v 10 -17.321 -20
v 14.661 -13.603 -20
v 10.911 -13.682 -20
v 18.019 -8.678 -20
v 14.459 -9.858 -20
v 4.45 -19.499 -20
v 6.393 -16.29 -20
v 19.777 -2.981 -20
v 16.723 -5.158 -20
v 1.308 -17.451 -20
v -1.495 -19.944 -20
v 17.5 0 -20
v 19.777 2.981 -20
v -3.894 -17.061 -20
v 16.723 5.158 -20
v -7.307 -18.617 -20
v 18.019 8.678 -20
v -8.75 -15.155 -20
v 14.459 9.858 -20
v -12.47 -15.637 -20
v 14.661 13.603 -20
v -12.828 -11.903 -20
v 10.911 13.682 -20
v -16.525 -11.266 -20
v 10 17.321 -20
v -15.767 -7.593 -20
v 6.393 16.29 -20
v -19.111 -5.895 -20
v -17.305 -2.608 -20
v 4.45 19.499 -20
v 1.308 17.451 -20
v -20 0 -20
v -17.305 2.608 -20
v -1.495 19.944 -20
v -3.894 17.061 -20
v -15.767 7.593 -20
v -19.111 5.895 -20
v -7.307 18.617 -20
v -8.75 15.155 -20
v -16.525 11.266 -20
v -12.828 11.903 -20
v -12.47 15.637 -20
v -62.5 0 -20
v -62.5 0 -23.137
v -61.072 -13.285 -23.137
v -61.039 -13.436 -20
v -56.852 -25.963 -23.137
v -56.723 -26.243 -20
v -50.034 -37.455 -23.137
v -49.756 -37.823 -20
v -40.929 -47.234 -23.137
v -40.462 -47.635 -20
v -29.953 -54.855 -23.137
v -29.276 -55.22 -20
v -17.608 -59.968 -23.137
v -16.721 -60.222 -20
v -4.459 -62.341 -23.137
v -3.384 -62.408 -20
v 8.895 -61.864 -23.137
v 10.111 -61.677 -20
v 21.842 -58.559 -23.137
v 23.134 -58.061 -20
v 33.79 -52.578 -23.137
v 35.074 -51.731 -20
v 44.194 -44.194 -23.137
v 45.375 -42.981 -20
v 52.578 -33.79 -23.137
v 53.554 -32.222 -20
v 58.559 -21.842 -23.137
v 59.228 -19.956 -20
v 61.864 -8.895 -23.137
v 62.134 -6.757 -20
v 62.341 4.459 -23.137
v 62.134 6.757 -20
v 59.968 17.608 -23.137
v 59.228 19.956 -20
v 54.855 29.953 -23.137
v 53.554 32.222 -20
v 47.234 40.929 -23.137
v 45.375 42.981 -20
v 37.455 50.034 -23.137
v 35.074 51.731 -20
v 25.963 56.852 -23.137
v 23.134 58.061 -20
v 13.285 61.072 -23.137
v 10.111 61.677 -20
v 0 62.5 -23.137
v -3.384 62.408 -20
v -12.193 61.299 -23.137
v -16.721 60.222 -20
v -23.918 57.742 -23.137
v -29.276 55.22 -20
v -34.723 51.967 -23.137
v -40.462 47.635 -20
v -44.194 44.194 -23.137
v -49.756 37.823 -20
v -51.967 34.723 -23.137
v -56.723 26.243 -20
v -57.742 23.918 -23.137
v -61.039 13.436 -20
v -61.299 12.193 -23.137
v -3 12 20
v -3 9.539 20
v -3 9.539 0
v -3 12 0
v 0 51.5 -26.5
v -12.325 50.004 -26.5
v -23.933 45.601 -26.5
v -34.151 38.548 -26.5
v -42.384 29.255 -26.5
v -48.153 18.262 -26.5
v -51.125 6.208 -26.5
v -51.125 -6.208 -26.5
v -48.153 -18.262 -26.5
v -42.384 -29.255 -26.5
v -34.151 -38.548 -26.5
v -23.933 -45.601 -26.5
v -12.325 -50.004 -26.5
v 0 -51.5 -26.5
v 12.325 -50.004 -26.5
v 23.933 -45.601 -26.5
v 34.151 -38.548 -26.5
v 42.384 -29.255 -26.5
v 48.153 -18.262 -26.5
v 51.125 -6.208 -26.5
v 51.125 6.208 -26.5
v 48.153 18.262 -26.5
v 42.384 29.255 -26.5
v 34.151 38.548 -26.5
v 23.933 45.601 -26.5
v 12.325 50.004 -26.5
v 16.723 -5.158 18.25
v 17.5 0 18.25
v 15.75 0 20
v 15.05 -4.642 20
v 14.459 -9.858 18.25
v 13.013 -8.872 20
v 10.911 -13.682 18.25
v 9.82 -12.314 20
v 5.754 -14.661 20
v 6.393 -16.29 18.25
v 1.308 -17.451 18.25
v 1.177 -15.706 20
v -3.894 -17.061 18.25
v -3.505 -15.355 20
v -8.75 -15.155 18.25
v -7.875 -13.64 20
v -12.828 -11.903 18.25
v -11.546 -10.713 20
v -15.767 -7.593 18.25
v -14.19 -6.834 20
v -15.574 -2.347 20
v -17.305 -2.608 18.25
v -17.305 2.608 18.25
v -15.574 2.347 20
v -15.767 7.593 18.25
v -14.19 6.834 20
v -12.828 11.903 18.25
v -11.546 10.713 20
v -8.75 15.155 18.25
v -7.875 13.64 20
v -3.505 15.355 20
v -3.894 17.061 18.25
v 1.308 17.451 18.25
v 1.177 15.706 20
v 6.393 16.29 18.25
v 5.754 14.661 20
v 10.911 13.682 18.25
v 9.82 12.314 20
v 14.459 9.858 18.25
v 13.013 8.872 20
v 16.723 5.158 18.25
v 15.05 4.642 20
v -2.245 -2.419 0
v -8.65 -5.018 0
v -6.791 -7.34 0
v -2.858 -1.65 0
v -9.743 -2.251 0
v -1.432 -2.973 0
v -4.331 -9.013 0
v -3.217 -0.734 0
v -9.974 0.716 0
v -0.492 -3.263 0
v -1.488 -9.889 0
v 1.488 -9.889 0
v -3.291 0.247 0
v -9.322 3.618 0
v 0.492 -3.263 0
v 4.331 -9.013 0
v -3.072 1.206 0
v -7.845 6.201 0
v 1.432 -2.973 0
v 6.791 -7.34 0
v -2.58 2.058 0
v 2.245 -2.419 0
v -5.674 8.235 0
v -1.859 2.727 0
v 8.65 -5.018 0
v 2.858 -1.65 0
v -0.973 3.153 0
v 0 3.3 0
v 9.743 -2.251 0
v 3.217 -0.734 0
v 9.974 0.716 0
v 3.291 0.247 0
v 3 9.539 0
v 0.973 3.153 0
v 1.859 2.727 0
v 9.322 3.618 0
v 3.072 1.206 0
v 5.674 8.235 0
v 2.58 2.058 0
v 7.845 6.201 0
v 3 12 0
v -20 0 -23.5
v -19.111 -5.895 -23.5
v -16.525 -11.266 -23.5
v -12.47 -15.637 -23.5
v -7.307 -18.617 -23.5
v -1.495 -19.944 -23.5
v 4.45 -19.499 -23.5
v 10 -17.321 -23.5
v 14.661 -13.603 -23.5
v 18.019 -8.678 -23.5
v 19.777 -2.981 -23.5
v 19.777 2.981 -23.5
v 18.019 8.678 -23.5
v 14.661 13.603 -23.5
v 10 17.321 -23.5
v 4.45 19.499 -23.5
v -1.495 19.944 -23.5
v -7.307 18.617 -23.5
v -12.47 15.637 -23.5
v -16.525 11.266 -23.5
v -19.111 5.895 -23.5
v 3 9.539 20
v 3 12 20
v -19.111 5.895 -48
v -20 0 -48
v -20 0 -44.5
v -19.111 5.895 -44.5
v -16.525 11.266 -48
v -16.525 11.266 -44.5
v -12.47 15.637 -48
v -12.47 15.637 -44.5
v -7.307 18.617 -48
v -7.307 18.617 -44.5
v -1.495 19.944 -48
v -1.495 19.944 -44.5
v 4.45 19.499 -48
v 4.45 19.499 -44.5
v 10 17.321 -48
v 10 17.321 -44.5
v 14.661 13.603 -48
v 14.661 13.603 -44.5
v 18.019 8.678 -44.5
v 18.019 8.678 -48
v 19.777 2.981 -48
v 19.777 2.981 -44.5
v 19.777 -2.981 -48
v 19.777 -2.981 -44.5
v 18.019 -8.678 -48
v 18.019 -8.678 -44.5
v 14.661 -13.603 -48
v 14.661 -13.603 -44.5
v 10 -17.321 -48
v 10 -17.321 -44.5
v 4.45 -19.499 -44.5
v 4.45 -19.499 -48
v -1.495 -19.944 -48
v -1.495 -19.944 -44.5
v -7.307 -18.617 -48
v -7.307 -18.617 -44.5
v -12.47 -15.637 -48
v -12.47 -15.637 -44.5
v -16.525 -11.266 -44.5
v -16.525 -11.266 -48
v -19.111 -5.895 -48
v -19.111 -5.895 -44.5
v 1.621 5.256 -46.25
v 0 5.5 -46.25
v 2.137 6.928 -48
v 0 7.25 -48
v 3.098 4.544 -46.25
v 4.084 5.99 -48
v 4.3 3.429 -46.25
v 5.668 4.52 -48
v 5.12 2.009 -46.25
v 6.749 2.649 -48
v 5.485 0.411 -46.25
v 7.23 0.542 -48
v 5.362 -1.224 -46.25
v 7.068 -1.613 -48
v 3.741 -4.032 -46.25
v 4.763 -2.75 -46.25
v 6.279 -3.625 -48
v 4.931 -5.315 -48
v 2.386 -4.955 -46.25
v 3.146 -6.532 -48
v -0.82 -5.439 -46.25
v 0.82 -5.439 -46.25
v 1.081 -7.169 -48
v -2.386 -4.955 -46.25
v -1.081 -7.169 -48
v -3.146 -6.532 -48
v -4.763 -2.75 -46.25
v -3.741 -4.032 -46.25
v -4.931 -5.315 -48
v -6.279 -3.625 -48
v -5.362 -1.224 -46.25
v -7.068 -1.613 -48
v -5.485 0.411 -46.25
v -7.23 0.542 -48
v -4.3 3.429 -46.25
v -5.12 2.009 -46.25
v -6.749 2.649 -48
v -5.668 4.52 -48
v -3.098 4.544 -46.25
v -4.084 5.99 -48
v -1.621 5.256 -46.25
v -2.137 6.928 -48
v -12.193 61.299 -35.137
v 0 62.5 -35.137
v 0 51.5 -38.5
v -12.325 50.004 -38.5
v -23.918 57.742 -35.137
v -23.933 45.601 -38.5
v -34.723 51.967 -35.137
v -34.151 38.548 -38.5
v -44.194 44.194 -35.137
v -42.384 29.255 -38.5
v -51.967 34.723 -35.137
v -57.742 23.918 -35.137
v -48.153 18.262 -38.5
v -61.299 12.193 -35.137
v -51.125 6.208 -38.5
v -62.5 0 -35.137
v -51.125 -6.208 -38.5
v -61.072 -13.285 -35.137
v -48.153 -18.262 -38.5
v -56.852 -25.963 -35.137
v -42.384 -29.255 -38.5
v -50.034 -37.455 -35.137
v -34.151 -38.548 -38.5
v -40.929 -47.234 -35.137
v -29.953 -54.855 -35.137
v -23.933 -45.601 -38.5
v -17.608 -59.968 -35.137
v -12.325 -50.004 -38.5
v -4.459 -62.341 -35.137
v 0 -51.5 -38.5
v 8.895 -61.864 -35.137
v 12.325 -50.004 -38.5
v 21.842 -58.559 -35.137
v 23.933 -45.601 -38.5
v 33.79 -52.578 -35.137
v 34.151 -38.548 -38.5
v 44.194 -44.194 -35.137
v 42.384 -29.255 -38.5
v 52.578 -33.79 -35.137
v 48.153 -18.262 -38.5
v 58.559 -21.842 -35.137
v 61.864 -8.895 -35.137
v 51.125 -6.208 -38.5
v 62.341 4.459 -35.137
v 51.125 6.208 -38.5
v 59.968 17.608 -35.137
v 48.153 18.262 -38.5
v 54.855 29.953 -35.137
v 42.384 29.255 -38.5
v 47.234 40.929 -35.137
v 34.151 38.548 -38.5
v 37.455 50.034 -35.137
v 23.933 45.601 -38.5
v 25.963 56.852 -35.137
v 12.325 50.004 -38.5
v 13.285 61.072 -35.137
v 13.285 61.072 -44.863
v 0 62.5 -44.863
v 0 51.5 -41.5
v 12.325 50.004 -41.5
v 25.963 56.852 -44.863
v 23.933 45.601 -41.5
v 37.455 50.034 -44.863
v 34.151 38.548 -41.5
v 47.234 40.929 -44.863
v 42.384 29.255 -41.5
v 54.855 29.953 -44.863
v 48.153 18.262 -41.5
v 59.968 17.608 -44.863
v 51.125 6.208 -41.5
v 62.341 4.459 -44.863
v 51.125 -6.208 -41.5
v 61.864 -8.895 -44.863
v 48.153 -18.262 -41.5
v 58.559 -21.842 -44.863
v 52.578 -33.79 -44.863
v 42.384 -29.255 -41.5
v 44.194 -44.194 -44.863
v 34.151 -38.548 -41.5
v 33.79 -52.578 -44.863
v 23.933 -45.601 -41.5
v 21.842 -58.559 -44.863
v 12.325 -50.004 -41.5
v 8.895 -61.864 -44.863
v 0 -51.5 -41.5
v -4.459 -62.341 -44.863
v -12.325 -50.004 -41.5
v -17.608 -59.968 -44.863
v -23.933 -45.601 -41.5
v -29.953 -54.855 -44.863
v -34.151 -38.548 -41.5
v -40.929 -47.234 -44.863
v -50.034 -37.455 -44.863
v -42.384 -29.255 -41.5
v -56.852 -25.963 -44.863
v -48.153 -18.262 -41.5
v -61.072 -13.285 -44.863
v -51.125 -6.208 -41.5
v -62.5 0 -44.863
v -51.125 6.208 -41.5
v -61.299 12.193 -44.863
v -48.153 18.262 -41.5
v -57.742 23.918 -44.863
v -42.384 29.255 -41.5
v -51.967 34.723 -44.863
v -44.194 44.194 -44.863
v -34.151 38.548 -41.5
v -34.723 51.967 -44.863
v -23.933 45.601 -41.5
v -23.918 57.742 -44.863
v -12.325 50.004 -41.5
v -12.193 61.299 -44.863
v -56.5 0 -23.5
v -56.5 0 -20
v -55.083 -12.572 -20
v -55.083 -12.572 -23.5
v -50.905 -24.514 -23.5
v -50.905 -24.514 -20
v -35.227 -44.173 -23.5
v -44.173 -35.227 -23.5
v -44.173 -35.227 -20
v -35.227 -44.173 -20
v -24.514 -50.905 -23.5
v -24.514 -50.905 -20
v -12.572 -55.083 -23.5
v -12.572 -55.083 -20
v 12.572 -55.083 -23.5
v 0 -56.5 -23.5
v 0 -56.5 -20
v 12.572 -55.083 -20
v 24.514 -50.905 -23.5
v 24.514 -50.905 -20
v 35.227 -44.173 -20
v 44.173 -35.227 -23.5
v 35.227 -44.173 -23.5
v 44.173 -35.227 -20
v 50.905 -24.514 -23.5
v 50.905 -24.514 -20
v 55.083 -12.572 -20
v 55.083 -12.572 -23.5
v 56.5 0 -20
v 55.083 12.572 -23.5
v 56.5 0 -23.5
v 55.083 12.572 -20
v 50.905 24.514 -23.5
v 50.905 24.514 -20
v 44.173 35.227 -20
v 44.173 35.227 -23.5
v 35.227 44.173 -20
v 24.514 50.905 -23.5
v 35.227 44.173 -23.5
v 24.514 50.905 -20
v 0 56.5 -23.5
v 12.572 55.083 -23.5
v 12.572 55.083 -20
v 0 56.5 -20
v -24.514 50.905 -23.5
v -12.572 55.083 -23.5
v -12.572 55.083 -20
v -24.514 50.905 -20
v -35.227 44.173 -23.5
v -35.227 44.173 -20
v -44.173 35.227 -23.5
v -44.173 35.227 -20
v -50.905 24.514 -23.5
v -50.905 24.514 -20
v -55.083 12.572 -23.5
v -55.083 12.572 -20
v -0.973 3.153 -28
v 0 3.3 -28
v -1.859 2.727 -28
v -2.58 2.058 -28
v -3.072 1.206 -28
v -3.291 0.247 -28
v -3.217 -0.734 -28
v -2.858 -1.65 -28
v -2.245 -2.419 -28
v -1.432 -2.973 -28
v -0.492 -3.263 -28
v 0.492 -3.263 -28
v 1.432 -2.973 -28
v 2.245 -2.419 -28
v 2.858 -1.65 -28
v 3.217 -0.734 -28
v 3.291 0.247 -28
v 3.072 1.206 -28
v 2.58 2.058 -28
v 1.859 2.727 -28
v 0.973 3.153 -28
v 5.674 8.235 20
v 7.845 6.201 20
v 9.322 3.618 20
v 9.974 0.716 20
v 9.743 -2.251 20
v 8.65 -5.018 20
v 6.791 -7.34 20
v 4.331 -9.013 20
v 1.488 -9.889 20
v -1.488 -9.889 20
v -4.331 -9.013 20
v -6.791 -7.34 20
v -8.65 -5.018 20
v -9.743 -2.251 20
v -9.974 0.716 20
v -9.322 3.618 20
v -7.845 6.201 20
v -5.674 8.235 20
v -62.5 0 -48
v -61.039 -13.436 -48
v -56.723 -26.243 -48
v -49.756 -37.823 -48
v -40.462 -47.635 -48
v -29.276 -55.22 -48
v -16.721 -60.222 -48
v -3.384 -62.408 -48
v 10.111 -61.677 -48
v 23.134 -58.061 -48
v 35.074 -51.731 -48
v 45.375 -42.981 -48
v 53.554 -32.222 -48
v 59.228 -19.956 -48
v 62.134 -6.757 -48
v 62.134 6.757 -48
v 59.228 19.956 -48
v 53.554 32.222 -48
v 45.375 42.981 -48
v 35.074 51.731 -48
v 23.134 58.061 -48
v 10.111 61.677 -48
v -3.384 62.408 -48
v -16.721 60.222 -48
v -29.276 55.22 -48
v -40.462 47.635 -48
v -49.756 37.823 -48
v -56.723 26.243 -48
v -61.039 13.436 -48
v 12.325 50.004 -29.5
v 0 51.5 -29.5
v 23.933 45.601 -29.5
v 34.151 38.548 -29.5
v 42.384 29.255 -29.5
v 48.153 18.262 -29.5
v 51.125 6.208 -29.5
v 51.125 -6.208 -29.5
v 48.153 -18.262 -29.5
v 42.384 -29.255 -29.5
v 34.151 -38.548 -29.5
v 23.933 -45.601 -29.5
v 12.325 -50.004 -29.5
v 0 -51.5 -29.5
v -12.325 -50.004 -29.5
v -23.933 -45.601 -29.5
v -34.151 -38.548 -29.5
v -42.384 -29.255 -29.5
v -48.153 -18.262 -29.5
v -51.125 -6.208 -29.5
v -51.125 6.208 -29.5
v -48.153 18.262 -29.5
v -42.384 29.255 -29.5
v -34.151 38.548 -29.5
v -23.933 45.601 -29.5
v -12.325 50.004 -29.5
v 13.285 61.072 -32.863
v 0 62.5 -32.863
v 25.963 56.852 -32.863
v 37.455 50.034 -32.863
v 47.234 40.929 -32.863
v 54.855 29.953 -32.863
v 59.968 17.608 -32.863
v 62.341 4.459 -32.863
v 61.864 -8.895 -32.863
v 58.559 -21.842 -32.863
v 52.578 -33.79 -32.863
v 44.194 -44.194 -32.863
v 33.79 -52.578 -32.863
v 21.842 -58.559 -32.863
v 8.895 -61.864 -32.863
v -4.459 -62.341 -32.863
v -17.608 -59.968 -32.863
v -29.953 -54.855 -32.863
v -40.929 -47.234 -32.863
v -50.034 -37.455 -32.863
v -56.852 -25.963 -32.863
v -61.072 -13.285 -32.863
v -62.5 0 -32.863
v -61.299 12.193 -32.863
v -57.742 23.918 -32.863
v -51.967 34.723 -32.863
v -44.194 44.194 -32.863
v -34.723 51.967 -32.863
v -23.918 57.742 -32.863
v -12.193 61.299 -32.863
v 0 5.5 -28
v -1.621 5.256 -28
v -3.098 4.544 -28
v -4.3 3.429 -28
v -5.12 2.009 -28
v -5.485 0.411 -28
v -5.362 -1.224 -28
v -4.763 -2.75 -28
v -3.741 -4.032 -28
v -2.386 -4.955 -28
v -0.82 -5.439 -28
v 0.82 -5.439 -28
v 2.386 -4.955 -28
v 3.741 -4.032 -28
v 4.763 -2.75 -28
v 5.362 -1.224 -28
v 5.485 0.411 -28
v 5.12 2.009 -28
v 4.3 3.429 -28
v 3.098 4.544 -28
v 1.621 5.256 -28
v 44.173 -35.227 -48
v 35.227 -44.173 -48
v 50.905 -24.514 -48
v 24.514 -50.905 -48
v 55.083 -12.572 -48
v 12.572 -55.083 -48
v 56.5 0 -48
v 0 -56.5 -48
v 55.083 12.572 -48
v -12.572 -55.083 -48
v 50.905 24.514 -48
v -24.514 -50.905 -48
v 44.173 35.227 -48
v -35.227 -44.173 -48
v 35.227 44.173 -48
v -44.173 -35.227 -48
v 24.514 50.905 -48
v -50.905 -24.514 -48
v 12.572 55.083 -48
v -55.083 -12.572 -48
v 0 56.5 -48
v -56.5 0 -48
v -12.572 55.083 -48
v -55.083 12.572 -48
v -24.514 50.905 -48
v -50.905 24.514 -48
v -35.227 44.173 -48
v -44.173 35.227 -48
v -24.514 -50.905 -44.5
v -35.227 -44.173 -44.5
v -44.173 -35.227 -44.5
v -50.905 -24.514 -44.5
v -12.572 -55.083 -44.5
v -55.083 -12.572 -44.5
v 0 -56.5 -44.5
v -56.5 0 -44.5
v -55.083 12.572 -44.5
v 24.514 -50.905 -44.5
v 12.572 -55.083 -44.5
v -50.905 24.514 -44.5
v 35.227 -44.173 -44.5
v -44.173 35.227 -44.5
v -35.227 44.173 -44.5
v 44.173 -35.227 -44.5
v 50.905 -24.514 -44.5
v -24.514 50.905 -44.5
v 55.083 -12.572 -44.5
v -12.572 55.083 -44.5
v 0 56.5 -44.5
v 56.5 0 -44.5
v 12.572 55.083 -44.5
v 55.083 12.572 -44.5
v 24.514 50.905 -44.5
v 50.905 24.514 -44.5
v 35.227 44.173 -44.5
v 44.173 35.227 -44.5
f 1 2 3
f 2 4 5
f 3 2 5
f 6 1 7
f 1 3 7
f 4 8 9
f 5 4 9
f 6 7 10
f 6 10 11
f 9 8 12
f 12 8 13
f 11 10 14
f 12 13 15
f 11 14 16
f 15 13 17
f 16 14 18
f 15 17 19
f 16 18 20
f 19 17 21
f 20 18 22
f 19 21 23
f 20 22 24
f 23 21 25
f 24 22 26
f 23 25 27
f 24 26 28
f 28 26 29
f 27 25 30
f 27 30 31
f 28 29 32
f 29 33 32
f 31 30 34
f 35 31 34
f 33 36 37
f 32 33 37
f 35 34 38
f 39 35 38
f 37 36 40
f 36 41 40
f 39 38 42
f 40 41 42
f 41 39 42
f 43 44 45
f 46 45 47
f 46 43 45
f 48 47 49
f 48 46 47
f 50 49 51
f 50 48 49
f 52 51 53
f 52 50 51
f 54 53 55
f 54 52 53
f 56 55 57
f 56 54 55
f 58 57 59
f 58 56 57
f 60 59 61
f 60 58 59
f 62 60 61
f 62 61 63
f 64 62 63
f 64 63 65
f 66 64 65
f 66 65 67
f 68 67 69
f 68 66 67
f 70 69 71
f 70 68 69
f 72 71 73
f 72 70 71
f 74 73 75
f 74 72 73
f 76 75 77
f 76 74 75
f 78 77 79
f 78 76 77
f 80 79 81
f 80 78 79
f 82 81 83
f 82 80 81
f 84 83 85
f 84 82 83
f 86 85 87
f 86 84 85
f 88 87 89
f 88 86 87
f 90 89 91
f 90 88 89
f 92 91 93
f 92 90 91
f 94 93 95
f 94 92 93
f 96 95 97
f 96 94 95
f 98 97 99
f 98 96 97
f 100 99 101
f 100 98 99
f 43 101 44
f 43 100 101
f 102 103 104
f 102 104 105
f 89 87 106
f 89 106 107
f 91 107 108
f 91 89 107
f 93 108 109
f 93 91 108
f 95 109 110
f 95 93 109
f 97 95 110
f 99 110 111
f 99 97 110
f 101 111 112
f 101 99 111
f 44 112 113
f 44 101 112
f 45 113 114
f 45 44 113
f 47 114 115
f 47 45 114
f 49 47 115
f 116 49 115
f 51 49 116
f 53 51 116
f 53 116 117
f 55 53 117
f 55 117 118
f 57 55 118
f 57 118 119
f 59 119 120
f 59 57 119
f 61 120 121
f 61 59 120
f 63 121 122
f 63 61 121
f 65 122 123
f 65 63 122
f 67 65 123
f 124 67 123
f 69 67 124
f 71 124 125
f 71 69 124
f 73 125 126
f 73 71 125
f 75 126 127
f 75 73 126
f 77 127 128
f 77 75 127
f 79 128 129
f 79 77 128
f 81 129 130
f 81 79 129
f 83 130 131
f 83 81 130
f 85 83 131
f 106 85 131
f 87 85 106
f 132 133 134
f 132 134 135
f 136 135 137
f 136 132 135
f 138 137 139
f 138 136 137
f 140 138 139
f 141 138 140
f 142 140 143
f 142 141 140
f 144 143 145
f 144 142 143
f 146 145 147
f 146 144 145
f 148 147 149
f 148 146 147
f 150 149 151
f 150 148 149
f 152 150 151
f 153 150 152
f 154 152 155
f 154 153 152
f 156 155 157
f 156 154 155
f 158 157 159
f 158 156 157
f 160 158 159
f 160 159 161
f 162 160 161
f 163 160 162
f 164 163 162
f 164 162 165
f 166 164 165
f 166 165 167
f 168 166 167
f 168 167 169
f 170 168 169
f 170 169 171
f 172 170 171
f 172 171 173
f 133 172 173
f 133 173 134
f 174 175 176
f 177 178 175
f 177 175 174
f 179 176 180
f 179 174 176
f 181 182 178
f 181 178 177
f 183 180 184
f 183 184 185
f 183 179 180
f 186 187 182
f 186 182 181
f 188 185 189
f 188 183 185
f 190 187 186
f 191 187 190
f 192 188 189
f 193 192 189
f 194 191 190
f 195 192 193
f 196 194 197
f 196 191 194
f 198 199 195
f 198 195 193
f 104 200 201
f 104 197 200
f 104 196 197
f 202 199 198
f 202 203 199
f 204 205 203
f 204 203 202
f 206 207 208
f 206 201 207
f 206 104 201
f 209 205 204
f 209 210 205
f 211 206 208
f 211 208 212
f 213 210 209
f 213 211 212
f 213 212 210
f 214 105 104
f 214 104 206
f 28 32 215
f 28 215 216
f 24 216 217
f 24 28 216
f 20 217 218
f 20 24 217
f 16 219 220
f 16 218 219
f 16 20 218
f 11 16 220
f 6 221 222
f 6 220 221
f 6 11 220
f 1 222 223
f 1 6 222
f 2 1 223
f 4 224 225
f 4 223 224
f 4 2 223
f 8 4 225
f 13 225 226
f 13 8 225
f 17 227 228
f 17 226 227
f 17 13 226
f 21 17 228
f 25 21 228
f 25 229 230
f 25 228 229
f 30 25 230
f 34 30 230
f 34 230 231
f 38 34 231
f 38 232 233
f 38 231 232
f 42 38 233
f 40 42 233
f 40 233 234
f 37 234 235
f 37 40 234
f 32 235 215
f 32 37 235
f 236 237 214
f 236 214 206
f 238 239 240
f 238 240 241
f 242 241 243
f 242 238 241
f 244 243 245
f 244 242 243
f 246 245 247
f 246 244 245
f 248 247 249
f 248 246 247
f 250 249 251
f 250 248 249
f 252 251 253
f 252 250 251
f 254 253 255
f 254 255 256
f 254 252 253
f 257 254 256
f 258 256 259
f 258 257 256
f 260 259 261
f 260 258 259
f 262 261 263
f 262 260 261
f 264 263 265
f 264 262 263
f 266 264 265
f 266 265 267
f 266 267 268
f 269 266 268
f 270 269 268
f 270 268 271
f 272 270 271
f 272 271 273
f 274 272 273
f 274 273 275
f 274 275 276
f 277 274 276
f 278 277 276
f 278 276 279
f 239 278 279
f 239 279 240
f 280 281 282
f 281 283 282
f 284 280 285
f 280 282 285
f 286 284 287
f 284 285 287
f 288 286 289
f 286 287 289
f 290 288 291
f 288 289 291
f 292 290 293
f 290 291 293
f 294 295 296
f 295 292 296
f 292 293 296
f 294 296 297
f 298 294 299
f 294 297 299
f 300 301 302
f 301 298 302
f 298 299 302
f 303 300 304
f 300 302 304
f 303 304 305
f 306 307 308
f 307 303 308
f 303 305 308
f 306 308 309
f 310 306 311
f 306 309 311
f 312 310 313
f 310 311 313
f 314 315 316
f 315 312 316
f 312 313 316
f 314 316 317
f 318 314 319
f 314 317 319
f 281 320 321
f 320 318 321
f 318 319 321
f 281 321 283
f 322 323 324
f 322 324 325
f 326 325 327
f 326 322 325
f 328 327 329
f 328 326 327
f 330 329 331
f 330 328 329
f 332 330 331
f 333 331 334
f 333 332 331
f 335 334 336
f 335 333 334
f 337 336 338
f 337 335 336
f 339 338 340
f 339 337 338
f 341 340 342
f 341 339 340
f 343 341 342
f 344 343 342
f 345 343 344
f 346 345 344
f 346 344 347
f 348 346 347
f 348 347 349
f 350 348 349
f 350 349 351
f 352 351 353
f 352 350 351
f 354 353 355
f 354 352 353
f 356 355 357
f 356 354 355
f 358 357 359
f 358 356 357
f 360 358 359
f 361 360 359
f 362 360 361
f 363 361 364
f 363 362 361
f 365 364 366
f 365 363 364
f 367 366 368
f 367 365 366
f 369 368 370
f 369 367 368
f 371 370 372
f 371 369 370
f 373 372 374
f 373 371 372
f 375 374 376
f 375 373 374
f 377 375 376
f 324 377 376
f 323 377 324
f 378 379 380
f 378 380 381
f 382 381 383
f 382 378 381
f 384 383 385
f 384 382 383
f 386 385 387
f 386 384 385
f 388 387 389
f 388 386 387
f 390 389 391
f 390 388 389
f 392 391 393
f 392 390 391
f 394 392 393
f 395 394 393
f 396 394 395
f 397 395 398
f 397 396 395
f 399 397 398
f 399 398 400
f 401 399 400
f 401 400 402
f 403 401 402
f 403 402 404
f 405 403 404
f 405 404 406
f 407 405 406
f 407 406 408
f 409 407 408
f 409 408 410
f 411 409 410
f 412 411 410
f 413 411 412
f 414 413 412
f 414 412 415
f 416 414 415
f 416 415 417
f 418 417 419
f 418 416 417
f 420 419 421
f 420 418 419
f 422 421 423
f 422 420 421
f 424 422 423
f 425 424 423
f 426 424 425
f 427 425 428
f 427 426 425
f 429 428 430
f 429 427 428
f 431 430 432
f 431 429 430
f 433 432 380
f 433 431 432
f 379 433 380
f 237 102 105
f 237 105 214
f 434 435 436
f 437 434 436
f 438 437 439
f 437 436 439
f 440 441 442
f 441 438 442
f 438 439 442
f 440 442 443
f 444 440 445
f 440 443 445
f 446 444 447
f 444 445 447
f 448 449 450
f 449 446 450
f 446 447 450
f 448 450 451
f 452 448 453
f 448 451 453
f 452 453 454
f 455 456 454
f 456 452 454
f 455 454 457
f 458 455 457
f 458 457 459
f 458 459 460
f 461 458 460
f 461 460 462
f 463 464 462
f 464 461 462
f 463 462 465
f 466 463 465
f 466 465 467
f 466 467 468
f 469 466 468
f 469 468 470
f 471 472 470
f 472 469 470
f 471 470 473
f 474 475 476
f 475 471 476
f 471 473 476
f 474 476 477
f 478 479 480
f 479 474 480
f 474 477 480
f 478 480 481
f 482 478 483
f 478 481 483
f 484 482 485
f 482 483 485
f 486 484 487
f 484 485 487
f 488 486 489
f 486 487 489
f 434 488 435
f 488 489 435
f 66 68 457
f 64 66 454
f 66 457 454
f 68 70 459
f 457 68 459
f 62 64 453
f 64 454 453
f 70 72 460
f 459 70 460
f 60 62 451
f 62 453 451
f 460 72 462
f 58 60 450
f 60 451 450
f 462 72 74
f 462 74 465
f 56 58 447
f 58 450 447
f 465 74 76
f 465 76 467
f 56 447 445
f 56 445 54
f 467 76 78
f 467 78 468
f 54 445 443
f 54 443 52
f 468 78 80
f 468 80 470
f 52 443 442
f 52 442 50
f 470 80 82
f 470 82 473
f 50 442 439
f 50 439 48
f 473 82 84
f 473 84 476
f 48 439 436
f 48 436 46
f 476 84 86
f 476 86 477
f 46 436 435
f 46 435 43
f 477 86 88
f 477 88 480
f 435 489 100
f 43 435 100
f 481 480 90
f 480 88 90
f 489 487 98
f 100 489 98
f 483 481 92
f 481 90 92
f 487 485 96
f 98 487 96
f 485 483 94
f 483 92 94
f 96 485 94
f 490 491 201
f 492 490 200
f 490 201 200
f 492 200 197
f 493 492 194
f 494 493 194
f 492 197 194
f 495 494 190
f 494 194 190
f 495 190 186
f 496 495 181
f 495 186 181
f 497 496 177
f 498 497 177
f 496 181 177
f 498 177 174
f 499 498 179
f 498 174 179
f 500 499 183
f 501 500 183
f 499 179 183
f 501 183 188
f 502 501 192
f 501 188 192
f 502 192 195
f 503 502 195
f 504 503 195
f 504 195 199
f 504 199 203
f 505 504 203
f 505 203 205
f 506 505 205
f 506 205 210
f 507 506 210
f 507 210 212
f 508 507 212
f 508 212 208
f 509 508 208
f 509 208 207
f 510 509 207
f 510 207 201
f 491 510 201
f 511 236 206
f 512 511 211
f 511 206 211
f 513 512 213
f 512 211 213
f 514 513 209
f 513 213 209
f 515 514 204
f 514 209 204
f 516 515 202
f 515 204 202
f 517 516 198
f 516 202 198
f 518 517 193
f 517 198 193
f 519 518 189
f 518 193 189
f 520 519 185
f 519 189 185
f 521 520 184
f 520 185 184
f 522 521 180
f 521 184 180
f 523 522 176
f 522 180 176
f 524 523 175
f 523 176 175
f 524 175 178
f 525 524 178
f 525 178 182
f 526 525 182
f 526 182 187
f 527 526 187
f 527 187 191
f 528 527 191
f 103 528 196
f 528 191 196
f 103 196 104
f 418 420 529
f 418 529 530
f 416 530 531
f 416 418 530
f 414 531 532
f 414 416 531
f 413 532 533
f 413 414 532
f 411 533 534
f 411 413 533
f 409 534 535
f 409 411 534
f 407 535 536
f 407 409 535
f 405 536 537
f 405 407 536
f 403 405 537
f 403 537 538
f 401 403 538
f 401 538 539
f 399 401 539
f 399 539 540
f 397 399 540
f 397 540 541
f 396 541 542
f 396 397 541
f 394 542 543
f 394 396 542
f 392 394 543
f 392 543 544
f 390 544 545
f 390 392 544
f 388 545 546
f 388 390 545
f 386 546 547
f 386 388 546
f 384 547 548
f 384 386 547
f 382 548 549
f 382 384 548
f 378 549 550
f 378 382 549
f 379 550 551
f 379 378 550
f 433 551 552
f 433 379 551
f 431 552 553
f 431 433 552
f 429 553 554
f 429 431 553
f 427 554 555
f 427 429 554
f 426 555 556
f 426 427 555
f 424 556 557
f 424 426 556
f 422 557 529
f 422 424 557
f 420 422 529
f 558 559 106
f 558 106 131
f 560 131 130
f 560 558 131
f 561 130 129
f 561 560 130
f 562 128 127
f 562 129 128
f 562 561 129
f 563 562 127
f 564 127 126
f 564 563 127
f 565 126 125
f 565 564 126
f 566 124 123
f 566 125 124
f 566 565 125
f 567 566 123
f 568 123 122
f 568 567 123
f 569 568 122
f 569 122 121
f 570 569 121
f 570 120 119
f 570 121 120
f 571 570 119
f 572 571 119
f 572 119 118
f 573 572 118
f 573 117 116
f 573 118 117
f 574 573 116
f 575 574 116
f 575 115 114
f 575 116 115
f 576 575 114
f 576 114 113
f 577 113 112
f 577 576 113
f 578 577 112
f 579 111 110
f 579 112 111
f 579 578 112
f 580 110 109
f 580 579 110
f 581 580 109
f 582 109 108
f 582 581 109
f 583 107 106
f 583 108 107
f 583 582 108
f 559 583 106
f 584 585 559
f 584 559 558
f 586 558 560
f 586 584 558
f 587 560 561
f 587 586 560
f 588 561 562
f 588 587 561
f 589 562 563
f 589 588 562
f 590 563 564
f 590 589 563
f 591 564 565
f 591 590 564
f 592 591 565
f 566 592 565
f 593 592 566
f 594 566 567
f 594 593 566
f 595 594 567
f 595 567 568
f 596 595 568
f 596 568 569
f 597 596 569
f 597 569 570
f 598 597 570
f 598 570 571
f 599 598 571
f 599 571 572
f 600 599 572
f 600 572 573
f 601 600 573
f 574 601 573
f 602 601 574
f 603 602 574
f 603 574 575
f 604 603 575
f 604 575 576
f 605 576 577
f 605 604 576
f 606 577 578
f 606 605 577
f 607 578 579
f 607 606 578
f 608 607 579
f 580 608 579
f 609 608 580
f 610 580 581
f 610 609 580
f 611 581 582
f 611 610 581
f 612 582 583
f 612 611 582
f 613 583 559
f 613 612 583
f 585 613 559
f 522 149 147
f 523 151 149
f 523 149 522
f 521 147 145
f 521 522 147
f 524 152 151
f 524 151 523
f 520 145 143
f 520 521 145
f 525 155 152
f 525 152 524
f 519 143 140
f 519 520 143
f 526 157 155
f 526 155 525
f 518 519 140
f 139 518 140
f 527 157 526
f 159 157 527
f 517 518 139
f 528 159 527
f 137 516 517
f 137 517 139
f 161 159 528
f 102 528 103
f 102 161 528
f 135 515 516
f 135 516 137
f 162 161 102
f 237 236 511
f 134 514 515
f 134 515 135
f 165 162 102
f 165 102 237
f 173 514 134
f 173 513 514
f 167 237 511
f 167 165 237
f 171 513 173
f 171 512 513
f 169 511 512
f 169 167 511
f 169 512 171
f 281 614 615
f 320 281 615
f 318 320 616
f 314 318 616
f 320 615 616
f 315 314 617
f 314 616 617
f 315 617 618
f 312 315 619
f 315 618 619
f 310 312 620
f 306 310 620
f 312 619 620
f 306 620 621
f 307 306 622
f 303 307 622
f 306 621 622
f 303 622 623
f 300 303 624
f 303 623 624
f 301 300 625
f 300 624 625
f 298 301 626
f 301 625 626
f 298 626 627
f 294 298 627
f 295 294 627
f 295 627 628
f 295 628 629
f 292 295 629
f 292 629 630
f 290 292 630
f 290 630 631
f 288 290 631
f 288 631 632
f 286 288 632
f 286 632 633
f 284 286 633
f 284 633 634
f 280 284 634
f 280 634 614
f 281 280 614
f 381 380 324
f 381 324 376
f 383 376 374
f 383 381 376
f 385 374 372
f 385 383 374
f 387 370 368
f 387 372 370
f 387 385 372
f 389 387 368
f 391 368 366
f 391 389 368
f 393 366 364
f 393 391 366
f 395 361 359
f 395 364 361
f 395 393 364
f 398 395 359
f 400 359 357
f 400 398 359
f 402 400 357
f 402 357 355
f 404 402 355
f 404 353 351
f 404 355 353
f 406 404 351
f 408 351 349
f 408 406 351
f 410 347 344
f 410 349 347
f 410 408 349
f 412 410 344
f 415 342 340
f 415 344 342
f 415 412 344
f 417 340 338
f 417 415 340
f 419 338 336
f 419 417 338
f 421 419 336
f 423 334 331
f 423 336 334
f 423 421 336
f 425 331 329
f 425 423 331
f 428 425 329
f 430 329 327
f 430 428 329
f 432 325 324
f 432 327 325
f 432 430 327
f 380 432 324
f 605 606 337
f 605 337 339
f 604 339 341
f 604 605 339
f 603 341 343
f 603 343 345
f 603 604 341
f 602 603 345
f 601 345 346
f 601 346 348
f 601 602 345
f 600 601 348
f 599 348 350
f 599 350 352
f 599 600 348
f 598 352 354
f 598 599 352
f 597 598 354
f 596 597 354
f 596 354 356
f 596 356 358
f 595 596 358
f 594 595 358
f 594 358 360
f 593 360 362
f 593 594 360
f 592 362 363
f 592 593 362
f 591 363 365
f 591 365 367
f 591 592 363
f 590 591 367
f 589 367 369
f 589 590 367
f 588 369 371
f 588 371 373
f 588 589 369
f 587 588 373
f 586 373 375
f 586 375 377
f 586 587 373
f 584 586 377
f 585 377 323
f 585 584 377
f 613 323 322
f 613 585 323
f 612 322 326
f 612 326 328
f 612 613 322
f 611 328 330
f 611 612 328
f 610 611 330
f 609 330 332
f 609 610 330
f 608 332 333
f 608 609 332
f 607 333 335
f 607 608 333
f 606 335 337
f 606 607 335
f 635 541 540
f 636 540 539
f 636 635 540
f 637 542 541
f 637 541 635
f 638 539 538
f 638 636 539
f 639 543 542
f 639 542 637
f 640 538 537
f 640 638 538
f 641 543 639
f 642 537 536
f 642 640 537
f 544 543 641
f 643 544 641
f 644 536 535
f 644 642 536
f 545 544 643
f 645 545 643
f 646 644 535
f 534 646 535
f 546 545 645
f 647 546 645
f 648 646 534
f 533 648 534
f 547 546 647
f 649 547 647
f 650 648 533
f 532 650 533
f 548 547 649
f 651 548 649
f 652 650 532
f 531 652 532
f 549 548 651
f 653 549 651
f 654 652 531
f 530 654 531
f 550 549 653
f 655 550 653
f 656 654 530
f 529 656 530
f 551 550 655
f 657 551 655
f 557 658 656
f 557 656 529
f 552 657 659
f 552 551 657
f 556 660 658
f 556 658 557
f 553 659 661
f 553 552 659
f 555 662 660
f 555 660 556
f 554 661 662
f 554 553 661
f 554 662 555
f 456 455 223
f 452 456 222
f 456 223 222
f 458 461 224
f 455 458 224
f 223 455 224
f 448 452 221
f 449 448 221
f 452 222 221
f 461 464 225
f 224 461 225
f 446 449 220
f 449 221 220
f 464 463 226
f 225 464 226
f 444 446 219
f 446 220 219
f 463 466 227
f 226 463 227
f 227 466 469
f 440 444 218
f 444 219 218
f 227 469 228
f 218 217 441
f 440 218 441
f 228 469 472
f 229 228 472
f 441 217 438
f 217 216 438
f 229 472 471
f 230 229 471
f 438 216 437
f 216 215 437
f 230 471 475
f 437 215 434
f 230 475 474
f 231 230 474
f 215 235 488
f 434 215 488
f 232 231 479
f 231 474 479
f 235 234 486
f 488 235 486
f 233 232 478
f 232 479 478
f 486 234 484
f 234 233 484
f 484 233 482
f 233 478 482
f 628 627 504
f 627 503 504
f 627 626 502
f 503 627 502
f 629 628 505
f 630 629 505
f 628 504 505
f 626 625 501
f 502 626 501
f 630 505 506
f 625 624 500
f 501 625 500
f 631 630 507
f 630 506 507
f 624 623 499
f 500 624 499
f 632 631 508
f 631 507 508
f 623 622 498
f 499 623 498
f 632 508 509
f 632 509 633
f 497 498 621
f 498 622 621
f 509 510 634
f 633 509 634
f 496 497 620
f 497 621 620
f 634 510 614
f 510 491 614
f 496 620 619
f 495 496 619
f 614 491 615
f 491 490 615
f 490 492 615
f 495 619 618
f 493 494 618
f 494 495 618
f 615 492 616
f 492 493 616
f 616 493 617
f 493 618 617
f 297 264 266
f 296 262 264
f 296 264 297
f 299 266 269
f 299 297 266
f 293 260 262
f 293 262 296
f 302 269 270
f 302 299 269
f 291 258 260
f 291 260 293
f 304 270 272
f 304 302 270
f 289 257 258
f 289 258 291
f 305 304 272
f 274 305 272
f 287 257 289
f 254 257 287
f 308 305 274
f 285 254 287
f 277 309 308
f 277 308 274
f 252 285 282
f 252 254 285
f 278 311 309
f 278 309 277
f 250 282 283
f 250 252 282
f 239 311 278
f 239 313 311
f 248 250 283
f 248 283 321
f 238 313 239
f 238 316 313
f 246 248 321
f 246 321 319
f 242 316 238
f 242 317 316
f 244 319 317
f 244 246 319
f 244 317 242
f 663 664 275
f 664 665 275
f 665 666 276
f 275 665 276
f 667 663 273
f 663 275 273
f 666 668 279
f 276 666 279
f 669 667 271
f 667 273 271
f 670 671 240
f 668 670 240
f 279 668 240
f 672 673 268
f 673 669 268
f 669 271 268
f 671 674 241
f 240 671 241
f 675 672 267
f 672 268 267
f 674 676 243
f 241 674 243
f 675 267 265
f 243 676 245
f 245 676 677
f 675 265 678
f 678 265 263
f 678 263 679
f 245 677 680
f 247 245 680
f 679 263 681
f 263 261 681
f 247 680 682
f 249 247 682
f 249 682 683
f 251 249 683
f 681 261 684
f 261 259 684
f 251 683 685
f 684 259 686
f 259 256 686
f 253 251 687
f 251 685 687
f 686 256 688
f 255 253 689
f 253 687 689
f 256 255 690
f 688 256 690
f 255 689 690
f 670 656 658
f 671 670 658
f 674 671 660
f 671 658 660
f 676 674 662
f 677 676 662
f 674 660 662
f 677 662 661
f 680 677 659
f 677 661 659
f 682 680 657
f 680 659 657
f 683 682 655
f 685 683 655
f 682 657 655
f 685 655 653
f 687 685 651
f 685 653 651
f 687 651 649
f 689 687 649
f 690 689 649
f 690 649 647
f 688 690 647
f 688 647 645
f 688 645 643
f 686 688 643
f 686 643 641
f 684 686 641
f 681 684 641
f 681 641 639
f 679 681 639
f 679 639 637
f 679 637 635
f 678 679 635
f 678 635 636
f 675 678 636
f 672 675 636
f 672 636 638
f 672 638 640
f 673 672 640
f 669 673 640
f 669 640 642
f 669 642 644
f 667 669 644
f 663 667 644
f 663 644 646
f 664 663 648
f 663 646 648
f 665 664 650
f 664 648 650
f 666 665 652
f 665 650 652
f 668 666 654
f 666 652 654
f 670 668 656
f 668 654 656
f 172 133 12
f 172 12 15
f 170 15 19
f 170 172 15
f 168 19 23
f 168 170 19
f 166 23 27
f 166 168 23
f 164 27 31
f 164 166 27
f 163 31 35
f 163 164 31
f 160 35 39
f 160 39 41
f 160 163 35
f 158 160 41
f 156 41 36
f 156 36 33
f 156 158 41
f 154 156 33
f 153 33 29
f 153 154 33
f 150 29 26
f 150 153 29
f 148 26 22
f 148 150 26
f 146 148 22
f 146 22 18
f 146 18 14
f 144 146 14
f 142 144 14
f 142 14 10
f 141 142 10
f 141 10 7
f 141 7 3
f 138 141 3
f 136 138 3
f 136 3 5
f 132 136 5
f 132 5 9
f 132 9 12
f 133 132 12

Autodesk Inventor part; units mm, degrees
ref_plane "YZ Plane" through (0, 0, 0) normal (1, 0, 0) x (0, 1, 0)
ref_plane "XZ Plane" through (0, 0, 0) normal (0, 1, 0) x (-1, 0, 0)
sketch "Sketch1" plane through (0, 0, 0) normal (0, 0, 1) x (1, 0, 0)
  circle A0 centre (0, 0) radius 10
  circle A1 centre (0, 0) radius 17.5
  line L0 (-3, 9.5394) -> (-3, 12)
  line L1 (-3, 12) -> (3, 12)
  line L2 (3, 12) -> (3, 9.5394)
  line L3 (-8.124, -15.5) -> (8.124, -15.5)
  dimension "d0" = 20
  dimension "d1" = 35
  dimension "d2" = 12
  dimension "d3" = 6
  dimension "d4" = 15.5
extrude "Extrusion1" add sketch "Sketch1" along normal mid plane 40 contours A0 | A0 L0 L1 L2 | A1 L3 | L3 A1
extrude "Extrusion2" [suppressed]
chamfer "Chamfer1" [suppressed]
sketch "Sketch2" plane through (0, 0, 0) normal (0, 1, 0) x (-1, 0, 0)
  line L0 (0, 10) -> (0, -10)
  point P0 (0, 0)
  point P1 (0, 0)
  dimension "d12" = 20
hole "Hole1" [suppressed]
sketch "Sketch3" plane through (0, 0, -20) normal (0, 0, -1) x (-1, 0, 0)
  circle A0 centre (0, 0) radius 17.5 projected
  circle A1 centre (0, 0) radius 62.5
  circle A2 centre (0, 0) radius 20
  circle A3 centre (0, 0) radius 56.5
  dimension "d32" = 125
  dimension "d45" = 6
  dimension "d46" = 40
extrude "Extrusion3" add sketch "Sketch3" along normal blind 28 contours A0 | A1 | A2 | A3
ref_plane "Work Plane1" through (0, 0, -34) normal (0, 0, 1) x (1, 0, 0)
extrude "Extrusion4" cut sketch "Sketch3" along normal blind 3.5 contours A3
mirror "Mirror1" about plane through (0, 0, -34) normal (0, 0, 1) of "Extrusion4"
sketch "Sketch4" plane through (0, 0, -48) normal (0, 0, -1) x (-1, 0, 0)
  point P0 (0, 0)
  point P1 (0, 0)
  point P2 (0, 0)
hole "Hole2" at (0, 0, -48) direction (0, 0, 1) diameter 6.6 end through all counterbore diameter 11 counterbore depth 20 clearance for "Socket Head Cap Screw ISO 4762" size "M6" standard "ISO"
chamfer "Chamfer2" distance 1.75 angle 45 1 edges at (-17.5, 0, 20)
sketch "Sketch5" plane through (0, 0, 0) normal (1, 0, 0) x (0, 1, 0)
  line L0 (62.5, -23.137) -> (51.5, -26.5)
  line L1 (51.5, -26.5) -> (51.5, -29.5)
  line L2 (51.5, -29.5) -> (62.5, -32.863)
  line L3 (51.5, -28) -> (62.5, -28) construction
  line L4 (62.5, -23.137) -> (62.5, -32.863)
  line L5 (62.5, -20) -> (62.5, -48) projected
  line L6 (0, -57.6) -> (0, 9.6) projected
  point P0 (0, 0)
  dimension "d34" = 34
  dimension "d35" = 11
  dimension "d39" = 3
  dimension "d40" = 8
revolve "Revolution1" cut sketch "Sketch5" angle 360 about axis through (0, 0, -10) along (0, 0, 1)
pattern_linear "Rectangular Pattern1" count 2 spacing 12 along (0, 0, -1) of "Revolution1"
extrude "Extrusion5" cut sketch "Sketch1" along normal through all contours A0 | A0 L0 L1 L2
chamfer "Chamfer3" distance 1.75 angle 45 1 edges at (0, -5.5, -48)
equation "\"d34\" = d37"
equation "\"d35\" = d38"
equation "\"d36\" = 8.5"
equation "\"d37\" = 34deg"
equation "\"d38\" = 11"
properties part number "PWTR-0094" material "Stainless Steel"
